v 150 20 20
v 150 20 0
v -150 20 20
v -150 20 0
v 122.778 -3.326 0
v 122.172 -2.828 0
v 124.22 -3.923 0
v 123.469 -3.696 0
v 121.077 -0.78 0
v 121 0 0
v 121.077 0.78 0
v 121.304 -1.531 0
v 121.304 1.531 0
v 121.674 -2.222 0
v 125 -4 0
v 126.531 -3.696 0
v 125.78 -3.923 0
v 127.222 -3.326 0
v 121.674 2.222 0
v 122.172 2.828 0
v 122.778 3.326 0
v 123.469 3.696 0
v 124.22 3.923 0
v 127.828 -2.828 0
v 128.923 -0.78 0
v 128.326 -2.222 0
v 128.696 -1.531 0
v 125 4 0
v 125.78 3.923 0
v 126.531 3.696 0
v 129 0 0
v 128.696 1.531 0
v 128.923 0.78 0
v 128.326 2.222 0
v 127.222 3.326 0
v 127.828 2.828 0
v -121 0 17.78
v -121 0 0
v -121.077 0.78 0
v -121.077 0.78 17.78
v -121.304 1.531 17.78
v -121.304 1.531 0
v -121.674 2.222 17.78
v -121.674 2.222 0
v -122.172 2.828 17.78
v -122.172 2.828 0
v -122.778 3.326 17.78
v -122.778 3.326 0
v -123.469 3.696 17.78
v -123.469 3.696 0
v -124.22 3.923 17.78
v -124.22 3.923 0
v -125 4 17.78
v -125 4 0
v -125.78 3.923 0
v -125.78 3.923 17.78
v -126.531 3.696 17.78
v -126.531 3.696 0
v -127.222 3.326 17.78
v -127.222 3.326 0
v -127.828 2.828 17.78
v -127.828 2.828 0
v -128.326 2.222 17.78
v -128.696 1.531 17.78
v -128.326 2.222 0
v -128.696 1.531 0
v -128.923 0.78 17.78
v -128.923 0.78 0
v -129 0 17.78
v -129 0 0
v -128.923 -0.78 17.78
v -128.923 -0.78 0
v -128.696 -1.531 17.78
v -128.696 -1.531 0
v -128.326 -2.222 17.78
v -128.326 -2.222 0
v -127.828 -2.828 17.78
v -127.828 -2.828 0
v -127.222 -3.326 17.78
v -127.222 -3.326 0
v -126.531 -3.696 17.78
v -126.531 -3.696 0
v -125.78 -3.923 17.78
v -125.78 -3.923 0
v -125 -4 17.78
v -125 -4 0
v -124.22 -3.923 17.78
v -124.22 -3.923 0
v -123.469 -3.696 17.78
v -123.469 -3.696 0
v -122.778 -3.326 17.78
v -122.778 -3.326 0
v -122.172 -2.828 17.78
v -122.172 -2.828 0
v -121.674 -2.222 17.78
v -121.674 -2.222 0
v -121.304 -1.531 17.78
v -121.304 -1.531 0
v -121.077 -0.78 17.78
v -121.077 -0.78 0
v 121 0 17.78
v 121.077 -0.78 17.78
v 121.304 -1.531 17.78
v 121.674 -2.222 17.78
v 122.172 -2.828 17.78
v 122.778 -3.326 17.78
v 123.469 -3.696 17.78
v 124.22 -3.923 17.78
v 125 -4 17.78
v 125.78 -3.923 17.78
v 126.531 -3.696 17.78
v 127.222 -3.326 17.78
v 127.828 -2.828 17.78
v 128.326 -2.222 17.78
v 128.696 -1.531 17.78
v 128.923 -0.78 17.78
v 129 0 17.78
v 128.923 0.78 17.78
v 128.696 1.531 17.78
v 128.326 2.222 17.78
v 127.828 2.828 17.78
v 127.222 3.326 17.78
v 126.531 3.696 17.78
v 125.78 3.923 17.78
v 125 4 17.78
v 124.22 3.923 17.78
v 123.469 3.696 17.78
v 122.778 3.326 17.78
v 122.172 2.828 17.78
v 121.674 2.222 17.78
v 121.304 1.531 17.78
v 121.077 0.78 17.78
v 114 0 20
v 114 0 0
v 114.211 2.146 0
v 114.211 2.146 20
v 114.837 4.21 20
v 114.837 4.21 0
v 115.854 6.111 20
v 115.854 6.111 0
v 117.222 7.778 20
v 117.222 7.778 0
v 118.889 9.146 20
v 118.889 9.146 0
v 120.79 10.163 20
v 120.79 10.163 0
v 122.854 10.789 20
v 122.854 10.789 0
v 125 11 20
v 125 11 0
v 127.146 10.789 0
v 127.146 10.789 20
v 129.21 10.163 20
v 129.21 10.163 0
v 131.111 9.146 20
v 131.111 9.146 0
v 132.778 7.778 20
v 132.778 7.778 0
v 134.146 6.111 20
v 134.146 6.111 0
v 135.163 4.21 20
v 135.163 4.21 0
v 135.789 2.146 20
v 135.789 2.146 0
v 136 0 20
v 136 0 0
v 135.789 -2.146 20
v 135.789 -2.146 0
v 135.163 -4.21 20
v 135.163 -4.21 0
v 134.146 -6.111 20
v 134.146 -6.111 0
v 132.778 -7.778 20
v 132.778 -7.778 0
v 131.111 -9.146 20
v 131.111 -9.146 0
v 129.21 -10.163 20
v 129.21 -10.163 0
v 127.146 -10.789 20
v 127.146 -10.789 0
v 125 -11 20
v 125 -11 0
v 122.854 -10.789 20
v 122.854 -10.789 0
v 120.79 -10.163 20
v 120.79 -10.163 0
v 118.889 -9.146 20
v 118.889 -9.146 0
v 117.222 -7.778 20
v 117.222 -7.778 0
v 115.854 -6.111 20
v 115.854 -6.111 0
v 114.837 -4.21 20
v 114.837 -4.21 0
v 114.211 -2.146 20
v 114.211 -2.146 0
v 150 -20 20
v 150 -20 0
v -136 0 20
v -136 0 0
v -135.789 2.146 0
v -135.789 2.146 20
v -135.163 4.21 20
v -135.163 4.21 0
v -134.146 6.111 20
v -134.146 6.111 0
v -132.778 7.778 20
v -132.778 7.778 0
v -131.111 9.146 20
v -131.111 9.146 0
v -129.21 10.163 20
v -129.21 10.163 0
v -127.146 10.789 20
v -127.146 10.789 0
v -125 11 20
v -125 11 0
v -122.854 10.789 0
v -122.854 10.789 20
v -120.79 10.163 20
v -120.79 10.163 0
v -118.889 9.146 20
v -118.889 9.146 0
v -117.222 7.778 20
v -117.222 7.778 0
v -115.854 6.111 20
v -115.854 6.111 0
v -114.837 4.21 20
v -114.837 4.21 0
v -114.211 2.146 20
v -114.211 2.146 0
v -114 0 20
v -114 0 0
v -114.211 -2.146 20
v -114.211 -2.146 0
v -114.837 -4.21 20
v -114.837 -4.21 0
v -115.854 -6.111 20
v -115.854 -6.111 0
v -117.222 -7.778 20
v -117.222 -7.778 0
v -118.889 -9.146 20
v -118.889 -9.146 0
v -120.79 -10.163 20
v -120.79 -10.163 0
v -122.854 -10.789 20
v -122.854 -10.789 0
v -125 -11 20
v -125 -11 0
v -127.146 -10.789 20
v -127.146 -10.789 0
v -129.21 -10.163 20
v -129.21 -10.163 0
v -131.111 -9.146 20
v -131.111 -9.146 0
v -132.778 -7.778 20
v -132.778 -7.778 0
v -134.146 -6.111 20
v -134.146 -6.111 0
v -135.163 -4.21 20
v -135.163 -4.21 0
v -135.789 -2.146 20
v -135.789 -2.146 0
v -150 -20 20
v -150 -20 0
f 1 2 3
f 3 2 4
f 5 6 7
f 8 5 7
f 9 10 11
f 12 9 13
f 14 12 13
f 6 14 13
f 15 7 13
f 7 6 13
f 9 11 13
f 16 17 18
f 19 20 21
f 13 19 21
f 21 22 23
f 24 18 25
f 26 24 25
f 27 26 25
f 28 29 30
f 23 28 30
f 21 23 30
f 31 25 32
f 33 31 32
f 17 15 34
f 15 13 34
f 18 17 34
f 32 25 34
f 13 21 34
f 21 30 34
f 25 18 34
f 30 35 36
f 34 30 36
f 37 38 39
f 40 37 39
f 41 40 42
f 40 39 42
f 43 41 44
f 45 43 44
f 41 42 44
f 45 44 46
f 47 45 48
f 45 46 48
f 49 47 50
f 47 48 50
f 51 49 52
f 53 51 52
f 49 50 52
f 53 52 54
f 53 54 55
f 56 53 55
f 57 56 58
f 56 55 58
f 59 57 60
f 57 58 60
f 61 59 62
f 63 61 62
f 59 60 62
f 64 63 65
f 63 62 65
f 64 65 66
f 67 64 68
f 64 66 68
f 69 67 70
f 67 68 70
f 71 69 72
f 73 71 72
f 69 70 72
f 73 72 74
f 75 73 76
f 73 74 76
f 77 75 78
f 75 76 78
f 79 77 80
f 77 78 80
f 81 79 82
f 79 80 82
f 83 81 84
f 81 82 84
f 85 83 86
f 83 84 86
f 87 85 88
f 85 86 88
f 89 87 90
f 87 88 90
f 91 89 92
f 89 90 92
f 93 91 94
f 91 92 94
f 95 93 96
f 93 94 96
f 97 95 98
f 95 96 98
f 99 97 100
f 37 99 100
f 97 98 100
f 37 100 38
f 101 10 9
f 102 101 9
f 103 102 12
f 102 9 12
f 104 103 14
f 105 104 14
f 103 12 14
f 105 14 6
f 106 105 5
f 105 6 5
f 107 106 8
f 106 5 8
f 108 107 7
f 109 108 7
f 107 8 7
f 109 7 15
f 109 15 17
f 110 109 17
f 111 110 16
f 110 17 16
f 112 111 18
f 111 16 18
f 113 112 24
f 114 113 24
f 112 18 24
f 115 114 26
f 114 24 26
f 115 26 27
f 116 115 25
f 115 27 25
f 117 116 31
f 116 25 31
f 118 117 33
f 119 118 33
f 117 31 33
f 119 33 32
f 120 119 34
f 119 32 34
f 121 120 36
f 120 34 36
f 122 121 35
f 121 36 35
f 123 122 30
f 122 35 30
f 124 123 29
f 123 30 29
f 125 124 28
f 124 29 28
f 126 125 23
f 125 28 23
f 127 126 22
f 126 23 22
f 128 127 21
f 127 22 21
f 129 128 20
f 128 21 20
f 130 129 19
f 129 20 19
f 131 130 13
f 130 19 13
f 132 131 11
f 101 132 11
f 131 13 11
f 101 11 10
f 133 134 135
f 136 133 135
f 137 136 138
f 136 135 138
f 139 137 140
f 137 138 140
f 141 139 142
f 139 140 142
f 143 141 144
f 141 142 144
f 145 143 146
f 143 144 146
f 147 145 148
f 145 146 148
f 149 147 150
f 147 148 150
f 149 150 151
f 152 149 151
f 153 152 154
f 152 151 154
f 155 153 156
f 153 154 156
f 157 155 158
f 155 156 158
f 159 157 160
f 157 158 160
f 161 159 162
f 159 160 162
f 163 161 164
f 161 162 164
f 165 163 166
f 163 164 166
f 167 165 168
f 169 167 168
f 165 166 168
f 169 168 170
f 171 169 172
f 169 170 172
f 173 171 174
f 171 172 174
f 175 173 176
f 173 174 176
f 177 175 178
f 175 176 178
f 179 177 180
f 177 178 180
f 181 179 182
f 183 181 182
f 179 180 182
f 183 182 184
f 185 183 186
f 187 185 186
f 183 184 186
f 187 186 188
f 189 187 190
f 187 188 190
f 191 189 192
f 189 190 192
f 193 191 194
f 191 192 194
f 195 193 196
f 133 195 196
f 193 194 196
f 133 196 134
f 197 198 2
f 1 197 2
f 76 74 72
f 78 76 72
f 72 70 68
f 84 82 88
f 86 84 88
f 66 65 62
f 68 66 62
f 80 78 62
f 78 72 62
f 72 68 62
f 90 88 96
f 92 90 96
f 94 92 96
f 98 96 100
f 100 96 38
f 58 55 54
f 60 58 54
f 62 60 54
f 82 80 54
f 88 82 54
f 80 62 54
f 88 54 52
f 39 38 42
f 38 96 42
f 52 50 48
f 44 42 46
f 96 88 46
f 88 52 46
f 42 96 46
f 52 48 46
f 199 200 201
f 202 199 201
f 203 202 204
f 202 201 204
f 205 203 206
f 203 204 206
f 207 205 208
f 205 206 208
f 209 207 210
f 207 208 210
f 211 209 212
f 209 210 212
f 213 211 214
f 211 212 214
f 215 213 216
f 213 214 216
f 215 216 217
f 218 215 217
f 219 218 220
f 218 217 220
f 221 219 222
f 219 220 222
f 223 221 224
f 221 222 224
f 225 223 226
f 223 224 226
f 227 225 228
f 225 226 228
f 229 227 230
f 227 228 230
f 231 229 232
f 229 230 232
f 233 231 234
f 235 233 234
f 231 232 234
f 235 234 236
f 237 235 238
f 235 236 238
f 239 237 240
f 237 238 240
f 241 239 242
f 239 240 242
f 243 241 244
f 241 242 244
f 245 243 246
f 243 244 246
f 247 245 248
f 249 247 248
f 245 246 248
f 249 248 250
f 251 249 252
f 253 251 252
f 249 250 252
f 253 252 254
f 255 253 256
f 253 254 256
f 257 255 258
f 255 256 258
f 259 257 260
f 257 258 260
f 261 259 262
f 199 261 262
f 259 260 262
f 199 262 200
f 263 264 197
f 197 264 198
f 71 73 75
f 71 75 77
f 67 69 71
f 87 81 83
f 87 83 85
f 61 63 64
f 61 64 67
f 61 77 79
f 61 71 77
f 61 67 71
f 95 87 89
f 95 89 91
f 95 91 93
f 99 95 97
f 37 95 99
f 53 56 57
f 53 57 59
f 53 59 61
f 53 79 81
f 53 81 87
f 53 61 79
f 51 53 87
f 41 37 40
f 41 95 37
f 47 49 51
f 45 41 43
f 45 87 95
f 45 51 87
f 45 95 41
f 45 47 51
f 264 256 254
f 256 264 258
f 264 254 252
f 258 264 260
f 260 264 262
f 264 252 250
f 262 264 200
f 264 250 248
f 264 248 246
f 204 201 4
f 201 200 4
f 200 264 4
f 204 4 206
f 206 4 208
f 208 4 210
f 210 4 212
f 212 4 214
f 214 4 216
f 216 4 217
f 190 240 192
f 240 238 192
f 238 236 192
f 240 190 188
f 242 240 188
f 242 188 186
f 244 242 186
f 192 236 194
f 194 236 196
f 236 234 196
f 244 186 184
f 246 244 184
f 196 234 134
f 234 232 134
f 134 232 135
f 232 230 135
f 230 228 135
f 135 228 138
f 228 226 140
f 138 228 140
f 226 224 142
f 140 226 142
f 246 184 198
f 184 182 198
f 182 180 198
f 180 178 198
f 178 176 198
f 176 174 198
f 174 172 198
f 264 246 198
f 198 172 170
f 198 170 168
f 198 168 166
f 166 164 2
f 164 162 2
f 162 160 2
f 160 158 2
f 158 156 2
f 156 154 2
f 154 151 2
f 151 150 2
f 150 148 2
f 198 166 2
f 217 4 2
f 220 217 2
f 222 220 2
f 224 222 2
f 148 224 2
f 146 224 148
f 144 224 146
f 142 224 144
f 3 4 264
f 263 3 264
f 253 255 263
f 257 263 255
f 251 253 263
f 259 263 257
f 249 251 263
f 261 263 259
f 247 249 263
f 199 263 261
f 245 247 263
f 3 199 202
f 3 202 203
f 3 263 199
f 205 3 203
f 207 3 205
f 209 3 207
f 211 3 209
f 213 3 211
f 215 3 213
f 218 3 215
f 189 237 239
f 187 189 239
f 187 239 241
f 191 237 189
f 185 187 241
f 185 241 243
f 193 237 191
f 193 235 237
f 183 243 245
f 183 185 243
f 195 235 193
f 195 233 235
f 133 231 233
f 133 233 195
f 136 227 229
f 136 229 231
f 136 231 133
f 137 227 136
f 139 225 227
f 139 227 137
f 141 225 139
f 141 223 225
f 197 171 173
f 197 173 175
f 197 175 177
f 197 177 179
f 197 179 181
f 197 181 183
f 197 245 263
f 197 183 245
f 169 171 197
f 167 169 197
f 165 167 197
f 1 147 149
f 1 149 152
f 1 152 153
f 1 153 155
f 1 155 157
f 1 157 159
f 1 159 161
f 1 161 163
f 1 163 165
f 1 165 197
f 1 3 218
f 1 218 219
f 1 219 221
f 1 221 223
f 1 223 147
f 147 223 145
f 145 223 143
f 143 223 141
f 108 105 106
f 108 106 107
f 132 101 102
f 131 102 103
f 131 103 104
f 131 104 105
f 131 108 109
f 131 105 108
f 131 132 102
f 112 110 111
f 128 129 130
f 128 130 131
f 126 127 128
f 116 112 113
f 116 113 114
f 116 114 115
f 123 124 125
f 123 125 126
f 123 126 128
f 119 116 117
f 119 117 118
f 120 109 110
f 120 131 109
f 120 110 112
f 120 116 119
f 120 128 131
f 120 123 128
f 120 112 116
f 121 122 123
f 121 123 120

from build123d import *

# Parameters (mm, degrees)
F1_DEPTH = 20
F2_DEPTH = 17.78


with BuildPart() as f1:
    # F0 (on Top) → F1 (new body)
    with BuildSketch(Plane.XY):
        with BuildLine():
            Line((150, -20), (150, 0))
            Line((150, 0), (136, 0))
            ThreePointArc((136, 0), (125, -11), (114, 0))
            Line((114, 0), (-114, 0))
            ThreePointArc((-114, 0), (-125, -11), (-136, 0))
            Line((-136, 0), (-150, 0))
            Line((-150, 0), (-150, -20))
            Line((-150, -20), (150, -20))
        make_face()
        with BuildLine():
            Line((150, 0), (150, 20))
            Line((150, 20), (125, 20))
            Line((125, 20), (-125, 20))
            Line((-125, 20), (-150, 20))
            Line((-150, 20), (-150, 0))
            Line((-150, 0), (-136, 0))
            ThreePointArc((-136, 0), (-125, 11), (-114, 0))
            Line((-114, 0), (114, 0))
            ThreePointArc((114, 0), (125, 11), (136, 0))
            Line((136, 0), (150, 0))
        make_face()
    extrude(amount=F1_DEPTH)

    # F0 (on Top) → F2 (join)
    with BuildSketch(Plane.XY):
        with BuildLine():
            Line((150, 0), (150, 20))
            Line((150, 20), (125, 20))
            Line((125, 20), (-125, 20))
            Line((-125, 20), (-150, 20))
            Line((-150, 20), (-150, 0))
            Line((-150, 0), (-136, 0))
            ThreePointArc((-136, 0), (-125, 11), (-114, 0))
            Line((-114, 0), (114, 0))
            ThreePointArc((114, 0), (125, 11), (136, 0))
            Line((136, 0), (150, 0))
        make_face()
        with BuildLine():
            Line((150, -20), (150, 0))
            Line((150, 0), (136, 0))
            ThreePointArc((136, 0), (125, -11), (114, 0))
            Line((114, 0), (-114, 0))
            ThreePointArc((-114, 0), (-125, -11), (-136, 0))
            Line((-136, 0), (-150, 0))
            Line((-150, 0), (-150, -20))
            Line((-150, -20), (150, -20))
        make_face()
    extrude(amount=F2_DEPTH)


with BuildPart() as f2:
    # F0 (on Top) → F2, piece 2 (new body)
    with BuildSketch(Plane.XY):
        with BuildLine():
            ThreePointArc((-129, 0), (-125, -4), (-121, 0))
            Line((-121, 0), (-129, 0))
        make_face()
        with BuildLine():
            Line((-129, 0), (-121, 0))
            ThreePointArc((-121, 0), (-125, 4), (-129, 0))
        make_face()
    extrude(amount=F2_DEPTH)


with BuildPart() as f2b:
    # F0 (on Top) → F2, piece 3 (new body)
    with BuildSketch(Plane.XY):
        with BuildLine():
            Line((121, 0), (129, 0))
            ThreePointArc((129, 0), (125, 4), (121, 0))
        make_face()
        with BuildLine():
            ThreePointArc((121, 0), (125, -4), (129, 0))
            Line((129, 0), (121, 0))
        make_face()
    extrude(amount=F2_DEPTH)


solid = Compound([f1.part, f2.part, f2b.part])
